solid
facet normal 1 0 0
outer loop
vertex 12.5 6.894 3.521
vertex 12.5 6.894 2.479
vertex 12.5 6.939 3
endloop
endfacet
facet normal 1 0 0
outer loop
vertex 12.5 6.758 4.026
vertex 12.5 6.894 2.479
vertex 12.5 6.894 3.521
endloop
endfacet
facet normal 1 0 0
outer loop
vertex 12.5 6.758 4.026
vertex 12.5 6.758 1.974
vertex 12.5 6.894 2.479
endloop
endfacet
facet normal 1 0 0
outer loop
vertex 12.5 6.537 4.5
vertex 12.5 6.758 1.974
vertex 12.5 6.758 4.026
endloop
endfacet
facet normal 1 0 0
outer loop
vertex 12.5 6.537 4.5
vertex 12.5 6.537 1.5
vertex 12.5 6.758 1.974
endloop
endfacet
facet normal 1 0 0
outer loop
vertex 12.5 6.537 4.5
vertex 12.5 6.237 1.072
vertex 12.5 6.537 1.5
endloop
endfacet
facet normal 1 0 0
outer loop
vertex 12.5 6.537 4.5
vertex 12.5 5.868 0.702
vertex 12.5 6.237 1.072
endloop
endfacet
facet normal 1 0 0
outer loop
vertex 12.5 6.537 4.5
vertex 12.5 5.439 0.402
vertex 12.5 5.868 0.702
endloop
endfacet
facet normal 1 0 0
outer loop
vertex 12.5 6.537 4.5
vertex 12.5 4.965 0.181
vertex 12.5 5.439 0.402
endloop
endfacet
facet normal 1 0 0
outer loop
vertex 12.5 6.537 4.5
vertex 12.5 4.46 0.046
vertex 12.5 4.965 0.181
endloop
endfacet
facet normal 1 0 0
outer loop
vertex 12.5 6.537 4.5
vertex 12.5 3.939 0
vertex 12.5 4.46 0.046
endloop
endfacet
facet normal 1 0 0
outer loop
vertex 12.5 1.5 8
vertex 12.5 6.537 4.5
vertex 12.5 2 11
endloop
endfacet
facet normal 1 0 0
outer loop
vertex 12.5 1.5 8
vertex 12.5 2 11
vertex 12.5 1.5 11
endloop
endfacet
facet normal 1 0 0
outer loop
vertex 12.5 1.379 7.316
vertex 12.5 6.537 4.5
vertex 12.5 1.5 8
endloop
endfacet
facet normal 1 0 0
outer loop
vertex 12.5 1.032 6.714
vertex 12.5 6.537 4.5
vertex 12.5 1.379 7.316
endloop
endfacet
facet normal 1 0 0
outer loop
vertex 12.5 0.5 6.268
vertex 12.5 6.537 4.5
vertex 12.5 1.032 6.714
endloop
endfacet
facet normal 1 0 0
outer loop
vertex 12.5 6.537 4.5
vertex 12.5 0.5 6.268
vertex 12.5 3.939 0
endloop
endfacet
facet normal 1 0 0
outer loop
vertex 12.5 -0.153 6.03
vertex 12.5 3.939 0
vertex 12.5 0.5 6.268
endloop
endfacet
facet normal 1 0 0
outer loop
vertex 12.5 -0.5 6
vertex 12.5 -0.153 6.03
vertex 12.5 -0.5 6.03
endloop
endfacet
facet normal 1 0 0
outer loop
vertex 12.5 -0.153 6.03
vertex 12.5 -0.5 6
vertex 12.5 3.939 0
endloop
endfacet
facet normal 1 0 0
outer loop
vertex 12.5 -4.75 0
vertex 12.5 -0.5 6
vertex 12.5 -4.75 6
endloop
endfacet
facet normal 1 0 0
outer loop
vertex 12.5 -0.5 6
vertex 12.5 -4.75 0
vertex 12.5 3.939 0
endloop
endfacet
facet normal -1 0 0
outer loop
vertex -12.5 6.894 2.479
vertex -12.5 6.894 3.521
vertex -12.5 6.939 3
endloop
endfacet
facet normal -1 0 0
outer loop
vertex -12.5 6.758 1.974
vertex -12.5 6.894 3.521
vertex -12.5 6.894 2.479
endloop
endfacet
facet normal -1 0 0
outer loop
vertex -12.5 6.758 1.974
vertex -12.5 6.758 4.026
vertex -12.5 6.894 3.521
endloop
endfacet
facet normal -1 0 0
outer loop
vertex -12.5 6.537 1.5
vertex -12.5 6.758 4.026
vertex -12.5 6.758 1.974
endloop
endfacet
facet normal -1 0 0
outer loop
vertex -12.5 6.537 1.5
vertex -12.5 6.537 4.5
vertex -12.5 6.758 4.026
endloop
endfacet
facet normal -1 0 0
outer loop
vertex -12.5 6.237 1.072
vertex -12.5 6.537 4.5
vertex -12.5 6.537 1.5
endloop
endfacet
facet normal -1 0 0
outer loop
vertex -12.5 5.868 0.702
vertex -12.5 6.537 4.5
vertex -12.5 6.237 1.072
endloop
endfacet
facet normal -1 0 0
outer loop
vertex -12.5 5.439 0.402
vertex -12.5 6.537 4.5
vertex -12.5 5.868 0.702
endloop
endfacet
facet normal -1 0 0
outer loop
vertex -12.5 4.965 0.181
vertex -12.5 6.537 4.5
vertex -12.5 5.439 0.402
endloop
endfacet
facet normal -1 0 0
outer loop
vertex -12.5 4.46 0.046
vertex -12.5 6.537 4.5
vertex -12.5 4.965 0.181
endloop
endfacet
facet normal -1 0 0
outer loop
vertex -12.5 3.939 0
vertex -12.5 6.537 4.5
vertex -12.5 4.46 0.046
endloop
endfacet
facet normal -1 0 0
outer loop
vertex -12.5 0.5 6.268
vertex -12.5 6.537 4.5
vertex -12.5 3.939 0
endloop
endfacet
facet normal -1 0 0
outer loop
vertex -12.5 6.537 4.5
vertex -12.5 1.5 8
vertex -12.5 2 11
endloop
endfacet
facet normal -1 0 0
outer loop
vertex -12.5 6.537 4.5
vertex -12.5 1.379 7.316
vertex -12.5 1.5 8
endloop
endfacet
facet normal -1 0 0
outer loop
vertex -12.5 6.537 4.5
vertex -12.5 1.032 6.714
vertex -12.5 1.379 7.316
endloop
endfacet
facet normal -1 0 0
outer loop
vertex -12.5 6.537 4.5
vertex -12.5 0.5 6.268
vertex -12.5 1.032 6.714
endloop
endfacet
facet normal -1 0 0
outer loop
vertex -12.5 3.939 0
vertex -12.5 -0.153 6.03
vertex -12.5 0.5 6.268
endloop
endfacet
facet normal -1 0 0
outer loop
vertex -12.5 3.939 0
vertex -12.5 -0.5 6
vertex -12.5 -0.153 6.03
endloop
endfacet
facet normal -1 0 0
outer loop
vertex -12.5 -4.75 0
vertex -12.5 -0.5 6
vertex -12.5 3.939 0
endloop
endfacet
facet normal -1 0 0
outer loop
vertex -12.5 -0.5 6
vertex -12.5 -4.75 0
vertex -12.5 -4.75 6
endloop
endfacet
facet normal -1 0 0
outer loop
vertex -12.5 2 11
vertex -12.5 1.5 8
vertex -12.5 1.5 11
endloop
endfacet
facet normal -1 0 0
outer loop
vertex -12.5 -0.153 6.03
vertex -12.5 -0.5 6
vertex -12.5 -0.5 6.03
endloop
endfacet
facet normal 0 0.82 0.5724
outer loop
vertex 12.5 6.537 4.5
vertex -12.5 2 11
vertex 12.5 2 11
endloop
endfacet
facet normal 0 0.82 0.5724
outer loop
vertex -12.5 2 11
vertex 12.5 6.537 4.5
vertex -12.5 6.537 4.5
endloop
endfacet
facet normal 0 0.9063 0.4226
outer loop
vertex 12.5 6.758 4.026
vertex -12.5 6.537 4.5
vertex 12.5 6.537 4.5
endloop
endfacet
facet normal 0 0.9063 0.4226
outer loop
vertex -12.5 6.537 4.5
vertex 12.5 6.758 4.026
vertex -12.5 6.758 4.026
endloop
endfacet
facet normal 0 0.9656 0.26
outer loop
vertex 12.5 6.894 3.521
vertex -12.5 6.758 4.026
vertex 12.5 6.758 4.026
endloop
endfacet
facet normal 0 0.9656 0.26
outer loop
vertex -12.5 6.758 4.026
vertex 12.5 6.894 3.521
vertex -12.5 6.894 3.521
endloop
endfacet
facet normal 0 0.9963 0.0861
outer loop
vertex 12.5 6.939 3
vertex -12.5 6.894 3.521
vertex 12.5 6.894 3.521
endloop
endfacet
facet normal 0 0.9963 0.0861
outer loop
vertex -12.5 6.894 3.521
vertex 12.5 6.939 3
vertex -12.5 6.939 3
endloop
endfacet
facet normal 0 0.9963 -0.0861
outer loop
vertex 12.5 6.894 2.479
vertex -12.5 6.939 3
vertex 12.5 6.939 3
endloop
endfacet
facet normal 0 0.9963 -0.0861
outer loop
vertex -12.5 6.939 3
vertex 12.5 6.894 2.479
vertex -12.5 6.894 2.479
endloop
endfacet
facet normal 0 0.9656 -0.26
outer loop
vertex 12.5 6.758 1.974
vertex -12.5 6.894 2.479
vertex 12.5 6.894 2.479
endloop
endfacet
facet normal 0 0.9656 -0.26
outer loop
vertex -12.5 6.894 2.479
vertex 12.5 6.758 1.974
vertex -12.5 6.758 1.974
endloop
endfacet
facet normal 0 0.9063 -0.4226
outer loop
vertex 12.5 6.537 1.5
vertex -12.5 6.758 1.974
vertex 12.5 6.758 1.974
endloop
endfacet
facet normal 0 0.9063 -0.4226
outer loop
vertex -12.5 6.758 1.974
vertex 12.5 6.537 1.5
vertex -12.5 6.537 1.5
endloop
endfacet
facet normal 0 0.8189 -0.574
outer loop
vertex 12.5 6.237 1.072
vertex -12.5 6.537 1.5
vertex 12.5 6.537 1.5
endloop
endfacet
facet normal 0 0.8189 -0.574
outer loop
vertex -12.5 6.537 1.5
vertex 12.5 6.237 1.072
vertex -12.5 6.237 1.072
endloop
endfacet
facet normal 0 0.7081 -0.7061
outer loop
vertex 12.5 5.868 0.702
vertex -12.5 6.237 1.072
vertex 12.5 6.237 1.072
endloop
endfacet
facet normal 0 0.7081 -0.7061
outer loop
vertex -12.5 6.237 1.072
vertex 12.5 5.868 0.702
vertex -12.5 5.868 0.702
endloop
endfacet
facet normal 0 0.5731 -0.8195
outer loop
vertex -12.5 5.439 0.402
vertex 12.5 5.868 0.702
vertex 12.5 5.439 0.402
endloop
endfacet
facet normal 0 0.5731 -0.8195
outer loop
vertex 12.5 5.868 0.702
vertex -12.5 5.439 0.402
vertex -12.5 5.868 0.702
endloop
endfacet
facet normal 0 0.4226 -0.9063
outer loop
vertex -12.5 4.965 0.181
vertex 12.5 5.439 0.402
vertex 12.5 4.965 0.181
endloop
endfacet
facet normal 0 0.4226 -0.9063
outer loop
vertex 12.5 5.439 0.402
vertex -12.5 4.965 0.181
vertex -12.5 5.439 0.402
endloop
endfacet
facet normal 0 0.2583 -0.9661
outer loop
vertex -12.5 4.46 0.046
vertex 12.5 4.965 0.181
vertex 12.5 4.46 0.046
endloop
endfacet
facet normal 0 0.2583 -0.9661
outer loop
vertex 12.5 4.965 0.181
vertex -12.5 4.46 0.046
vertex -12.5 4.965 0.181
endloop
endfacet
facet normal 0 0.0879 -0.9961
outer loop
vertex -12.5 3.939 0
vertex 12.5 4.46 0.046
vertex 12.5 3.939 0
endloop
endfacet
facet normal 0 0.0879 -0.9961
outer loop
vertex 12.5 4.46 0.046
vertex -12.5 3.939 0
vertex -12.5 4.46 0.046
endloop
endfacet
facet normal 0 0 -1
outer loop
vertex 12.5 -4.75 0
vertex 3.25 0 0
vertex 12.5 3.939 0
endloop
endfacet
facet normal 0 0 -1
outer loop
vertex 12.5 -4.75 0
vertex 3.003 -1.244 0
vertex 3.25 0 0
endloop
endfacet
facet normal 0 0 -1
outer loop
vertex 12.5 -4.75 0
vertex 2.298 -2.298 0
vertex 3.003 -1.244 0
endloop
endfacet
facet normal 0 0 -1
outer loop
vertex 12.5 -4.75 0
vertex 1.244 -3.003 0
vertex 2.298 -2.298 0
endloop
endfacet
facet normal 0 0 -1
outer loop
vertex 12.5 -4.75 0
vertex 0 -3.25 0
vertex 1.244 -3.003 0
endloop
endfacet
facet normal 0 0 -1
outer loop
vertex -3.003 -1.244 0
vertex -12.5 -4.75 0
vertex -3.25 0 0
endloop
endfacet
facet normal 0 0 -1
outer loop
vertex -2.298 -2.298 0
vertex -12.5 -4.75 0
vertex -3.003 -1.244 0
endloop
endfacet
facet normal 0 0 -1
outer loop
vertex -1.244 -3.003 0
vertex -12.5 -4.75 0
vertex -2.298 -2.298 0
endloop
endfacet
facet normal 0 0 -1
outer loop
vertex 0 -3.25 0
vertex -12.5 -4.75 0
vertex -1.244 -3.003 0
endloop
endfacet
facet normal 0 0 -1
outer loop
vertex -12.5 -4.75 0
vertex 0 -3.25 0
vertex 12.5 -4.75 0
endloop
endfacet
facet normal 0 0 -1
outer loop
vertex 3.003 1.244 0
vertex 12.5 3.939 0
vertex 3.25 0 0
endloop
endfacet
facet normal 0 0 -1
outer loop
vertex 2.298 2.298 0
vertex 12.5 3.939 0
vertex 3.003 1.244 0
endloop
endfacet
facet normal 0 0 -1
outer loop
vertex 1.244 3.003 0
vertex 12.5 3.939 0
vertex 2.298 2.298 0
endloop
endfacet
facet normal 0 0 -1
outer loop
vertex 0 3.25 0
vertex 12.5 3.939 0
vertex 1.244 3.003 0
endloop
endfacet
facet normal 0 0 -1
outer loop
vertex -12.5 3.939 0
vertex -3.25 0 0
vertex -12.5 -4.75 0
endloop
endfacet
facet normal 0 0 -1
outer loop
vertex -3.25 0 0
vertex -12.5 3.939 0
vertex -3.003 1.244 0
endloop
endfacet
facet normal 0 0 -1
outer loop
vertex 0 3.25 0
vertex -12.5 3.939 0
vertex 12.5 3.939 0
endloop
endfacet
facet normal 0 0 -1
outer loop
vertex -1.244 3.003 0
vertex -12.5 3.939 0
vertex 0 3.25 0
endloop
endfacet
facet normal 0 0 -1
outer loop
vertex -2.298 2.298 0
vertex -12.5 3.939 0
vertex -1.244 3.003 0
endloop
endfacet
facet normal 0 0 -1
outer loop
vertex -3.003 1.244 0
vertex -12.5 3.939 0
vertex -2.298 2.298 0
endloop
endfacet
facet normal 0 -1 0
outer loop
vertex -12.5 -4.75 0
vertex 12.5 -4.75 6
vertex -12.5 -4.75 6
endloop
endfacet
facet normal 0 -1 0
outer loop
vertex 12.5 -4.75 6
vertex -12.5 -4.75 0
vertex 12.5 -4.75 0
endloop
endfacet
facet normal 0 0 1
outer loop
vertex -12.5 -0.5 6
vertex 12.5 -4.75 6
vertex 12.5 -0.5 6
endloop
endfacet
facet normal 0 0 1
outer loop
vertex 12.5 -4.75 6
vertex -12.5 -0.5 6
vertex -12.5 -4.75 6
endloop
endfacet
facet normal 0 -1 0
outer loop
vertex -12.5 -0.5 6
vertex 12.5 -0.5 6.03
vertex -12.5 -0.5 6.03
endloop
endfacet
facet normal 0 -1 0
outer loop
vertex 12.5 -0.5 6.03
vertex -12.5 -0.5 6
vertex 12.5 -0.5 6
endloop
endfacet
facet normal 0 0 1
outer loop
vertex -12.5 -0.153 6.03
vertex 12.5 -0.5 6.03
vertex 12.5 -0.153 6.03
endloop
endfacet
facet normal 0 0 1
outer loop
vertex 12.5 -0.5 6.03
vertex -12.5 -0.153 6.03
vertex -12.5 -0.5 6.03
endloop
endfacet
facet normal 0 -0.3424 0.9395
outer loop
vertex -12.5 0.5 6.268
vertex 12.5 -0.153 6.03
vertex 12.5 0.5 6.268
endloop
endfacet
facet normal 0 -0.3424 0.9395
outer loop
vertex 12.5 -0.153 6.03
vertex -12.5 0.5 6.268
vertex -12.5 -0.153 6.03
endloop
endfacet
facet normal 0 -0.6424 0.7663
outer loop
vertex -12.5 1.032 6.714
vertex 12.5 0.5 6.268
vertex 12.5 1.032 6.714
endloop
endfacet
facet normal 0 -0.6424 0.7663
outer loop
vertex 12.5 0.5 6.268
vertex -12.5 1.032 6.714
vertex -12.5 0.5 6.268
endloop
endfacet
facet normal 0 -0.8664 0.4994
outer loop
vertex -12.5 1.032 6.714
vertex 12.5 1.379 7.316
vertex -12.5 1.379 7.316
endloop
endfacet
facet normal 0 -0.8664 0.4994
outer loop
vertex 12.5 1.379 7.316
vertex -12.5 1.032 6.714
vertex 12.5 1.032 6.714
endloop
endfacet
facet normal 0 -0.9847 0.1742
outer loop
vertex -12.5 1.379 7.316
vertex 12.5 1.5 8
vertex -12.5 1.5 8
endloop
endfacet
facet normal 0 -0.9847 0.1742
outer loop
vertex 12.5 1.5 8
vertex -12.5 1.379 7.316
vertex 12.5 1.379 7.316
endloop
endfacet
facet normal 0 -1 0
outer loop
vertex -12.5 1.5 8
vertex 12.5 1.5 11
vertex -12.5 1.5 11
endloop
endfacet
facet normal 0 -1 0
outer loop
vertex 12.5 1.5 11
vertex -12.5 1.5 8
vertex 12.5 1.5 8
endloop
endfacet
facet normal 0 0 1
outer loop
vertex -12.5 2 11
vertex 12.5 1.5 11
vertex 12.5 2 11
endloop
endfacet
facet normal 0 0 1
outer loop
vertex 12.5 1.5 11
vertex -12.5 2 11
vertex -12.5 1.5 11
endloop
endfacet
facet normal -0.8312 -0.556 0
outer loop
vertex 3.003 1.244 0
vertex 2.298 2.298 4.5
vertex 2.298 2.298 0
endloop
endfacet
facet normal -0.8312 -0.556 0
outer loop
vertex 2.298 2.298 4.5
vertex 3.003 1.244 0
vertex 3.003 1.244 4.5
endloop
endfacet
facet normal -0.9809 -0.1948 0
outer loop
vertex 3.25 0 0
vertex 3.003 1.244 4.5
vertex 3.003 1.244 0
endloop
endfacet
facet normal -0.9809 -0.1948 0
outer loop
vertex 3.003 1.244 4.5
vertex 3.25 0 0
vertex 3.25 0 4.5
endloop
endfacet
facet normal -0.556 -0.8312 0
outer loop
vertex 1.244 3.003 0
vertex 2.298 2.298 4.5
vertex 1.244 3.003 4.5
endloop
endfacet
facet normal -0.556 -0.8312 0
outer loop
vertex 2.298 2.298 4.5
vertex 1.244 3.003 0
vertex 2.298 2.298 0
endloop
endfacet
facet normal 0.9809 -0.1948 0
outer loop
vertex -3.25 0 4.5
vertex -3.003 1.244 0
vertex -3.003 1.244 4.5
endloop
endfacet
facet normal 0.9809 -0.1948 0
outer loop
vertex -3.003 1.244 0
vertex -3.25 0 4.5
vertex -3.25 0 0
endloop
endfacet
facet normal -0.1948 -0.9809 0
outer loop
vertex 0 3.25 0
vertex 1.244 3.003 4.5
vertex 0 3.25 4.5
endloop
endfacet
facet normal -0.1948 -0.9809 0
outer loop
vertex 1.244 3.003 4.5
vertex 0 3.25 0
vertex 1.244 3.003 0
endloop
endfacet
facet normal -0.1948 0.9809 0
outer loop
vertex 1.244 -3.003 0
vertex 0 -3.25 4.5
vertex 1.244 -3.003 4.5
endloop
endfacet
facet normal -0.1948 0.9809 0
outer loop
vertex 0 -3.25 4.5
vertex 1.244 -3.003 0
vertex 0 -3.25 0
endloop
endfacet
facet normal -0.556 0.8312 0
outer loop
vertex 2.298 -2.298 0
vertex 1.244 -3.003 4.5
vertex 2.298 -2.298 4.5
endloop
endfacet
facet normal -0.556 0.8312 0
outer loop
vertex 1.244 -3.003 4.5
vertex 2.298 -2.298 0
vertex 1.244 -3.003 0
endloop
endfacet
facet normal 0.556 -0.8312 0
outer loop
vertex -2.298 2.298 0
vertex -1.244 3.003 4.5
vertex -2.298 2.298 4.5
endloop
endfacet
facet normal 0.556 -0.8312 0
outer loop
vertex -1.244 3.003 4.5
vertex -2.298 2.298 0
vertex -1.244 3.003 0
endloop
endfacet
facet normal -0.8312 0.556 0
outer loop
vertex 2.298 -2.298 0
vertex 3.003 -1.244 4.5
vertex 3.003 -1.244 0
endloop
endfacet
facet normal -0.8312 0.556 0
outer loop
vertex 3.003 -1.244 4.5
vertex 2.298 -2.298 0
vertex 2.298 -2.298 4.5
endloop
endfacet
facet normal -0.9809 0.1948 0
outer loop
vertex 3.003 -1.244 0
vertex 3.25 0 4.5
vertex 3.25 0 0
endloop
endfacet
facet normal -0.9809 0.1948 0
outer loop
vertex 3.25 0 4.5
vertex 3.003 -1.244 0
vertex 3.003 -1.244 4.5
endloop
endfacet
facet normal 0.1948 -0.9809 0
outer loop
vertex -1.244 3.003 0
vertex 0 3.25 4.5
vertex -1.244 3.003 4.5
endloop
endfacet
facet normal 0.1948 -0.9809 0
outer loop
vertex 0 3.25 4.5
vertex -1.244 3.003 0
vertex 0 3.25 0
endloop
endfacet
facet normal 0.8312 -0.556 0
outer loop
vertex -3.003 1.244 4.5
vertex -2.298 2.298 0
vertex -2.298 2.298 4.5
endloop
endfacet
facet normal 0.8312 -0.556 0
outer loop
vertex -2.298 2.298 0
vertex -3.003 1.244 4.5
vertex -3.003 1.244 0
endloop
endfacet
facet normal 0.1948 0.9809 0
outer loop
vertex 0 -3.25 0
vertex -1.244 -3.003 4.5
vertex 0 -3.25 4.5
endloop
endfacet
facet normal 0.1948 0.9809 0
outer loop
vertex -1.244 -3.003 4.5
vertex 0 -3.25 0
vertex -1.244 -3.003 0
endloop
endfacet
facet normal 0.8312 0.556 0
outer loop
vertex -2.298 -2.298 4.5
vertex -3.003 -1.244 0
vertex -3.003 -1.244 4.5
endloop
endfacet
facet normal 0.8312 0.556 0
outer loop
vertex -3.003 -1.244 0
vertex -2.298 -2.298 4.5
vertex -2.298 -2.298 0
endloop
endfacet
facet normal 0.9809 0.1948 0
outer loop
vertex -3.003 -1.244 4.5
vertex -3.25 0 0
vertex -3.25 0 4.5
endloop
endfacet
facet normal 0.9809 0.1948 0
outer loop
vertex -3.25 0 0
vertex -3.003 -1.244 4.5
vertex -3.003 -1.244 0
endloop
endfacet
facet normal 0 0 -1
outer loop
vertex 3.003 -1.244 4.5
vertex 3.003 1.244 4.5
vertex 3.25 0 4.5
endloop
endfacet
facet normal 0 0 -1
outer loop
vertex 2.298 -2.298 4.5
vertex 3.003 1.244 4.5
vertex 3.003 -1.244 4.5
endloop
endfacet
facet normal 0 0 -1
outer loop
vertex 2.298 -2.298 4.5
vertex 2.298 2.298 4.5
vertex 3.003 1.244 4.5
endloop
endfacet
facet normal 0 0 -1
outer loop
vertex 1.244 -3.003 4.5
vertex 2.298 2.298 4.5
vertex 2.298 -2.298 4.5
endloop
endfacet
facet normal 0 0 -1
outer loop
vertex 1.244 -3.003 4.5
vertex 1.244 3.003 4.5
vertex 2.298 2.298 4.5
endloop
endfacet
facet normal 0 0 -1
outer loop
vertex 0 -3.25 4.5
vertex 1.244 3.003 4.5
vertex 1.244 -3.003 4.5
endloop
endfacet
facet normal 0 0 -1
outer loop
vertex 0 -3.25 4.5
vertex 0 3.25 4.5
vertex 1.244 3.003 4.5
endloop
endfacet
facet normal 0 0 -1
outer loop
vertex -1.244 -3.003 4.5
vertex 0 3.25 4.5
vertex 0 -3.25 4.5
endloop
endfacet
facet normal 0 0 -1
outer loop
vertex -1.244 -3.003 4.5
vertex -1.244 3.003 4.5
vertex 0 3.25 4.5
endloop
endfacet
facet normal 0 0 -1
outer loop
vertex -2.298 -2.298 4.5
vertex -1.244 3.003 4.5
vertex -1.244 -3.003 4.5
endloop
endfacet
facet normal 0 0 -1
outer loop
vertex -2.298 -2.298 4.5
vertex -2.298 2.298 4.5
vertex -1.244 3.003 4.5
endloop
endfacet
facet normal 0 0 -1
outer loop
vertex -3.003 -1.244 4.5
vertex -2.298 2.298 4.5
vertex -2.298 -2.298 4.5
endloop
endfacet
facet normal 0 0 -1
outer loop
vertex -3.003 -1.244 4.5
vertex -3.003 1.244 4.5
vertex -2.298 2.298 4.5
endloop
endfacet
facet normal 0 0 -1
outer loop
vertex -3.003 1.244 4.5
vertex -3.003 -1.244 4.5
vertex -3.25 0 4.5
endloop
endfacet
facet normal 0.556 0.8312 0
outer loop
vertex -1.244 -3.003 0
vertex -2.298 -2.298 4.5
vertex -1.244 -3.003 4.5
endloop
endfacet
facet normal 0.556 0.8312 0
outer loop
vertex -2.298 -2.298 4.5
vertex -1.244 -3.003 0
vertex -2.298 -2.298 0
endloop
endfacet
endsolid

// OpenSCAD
w = 25; //Width
bh = 6;	//Base height
th = 5; //Tooth height
sr = 3.25; //Shaft radius
sl = 4.5; //Socket length
ttd = 0.5; //Tooth depth at top
ta = 35; //Tooth steepness
tbr = 2; //Tooth base radius
so = 1.5; //Shaft offset
sd = bh-1; //Shaft insertion depth
bd = so+sr+1.5; //Base depth

module tooth_profile(){
//Y Centre of the front curve is (th+bh/2)*tan(ta)-bh/(2*cos(ta))+ttd
//Slope intersection with curve X Centre - correction for tangent with curve + tooth depth
    //Tooth and part of front curve forward of tooth edge
    hull(){
        polygon([[-bh/2,0],[th,0],[th,ttd]]);
        translate([-bh/2,0])
            difference(){
                translate([0,(th+bh/2)*tan(ta)-bh/(2*cos(ta))+ttd]) circle(bh/2,$fn=36);
                translate([-bh/2,-bh]) square([bh,bh]);
            }
        }
    
    //Base including entire front curve
    hull(){
        translate([-bh/2,(th+bh/2)*tan(ta)-bh/(2*cos(ta))+ttd]) circle(bh/2,$fn=36);
        translate([-bh,-bd]) square([bh,0.1]);
        translate([-0.1,-0.1]) square([0.1,0.1]);
    }
    
    //Fill at base of tooth
    translate([tbr,-tbr]) rotate([0,0,90]) difference(){
        square([tbr,tbr]);
        circle(tbr,$fn=18);
    }
}

module hook() {
	
	echo("Hook tooth to shaft centre: ",so);

	difference(){
		translate([w/2,so,bh]) rotate([0,-90,0]) linear_extrude(w) tooth_profile();
		cylinder(sl,sr,sr,$fn=16);
	}

    

}

hook();
